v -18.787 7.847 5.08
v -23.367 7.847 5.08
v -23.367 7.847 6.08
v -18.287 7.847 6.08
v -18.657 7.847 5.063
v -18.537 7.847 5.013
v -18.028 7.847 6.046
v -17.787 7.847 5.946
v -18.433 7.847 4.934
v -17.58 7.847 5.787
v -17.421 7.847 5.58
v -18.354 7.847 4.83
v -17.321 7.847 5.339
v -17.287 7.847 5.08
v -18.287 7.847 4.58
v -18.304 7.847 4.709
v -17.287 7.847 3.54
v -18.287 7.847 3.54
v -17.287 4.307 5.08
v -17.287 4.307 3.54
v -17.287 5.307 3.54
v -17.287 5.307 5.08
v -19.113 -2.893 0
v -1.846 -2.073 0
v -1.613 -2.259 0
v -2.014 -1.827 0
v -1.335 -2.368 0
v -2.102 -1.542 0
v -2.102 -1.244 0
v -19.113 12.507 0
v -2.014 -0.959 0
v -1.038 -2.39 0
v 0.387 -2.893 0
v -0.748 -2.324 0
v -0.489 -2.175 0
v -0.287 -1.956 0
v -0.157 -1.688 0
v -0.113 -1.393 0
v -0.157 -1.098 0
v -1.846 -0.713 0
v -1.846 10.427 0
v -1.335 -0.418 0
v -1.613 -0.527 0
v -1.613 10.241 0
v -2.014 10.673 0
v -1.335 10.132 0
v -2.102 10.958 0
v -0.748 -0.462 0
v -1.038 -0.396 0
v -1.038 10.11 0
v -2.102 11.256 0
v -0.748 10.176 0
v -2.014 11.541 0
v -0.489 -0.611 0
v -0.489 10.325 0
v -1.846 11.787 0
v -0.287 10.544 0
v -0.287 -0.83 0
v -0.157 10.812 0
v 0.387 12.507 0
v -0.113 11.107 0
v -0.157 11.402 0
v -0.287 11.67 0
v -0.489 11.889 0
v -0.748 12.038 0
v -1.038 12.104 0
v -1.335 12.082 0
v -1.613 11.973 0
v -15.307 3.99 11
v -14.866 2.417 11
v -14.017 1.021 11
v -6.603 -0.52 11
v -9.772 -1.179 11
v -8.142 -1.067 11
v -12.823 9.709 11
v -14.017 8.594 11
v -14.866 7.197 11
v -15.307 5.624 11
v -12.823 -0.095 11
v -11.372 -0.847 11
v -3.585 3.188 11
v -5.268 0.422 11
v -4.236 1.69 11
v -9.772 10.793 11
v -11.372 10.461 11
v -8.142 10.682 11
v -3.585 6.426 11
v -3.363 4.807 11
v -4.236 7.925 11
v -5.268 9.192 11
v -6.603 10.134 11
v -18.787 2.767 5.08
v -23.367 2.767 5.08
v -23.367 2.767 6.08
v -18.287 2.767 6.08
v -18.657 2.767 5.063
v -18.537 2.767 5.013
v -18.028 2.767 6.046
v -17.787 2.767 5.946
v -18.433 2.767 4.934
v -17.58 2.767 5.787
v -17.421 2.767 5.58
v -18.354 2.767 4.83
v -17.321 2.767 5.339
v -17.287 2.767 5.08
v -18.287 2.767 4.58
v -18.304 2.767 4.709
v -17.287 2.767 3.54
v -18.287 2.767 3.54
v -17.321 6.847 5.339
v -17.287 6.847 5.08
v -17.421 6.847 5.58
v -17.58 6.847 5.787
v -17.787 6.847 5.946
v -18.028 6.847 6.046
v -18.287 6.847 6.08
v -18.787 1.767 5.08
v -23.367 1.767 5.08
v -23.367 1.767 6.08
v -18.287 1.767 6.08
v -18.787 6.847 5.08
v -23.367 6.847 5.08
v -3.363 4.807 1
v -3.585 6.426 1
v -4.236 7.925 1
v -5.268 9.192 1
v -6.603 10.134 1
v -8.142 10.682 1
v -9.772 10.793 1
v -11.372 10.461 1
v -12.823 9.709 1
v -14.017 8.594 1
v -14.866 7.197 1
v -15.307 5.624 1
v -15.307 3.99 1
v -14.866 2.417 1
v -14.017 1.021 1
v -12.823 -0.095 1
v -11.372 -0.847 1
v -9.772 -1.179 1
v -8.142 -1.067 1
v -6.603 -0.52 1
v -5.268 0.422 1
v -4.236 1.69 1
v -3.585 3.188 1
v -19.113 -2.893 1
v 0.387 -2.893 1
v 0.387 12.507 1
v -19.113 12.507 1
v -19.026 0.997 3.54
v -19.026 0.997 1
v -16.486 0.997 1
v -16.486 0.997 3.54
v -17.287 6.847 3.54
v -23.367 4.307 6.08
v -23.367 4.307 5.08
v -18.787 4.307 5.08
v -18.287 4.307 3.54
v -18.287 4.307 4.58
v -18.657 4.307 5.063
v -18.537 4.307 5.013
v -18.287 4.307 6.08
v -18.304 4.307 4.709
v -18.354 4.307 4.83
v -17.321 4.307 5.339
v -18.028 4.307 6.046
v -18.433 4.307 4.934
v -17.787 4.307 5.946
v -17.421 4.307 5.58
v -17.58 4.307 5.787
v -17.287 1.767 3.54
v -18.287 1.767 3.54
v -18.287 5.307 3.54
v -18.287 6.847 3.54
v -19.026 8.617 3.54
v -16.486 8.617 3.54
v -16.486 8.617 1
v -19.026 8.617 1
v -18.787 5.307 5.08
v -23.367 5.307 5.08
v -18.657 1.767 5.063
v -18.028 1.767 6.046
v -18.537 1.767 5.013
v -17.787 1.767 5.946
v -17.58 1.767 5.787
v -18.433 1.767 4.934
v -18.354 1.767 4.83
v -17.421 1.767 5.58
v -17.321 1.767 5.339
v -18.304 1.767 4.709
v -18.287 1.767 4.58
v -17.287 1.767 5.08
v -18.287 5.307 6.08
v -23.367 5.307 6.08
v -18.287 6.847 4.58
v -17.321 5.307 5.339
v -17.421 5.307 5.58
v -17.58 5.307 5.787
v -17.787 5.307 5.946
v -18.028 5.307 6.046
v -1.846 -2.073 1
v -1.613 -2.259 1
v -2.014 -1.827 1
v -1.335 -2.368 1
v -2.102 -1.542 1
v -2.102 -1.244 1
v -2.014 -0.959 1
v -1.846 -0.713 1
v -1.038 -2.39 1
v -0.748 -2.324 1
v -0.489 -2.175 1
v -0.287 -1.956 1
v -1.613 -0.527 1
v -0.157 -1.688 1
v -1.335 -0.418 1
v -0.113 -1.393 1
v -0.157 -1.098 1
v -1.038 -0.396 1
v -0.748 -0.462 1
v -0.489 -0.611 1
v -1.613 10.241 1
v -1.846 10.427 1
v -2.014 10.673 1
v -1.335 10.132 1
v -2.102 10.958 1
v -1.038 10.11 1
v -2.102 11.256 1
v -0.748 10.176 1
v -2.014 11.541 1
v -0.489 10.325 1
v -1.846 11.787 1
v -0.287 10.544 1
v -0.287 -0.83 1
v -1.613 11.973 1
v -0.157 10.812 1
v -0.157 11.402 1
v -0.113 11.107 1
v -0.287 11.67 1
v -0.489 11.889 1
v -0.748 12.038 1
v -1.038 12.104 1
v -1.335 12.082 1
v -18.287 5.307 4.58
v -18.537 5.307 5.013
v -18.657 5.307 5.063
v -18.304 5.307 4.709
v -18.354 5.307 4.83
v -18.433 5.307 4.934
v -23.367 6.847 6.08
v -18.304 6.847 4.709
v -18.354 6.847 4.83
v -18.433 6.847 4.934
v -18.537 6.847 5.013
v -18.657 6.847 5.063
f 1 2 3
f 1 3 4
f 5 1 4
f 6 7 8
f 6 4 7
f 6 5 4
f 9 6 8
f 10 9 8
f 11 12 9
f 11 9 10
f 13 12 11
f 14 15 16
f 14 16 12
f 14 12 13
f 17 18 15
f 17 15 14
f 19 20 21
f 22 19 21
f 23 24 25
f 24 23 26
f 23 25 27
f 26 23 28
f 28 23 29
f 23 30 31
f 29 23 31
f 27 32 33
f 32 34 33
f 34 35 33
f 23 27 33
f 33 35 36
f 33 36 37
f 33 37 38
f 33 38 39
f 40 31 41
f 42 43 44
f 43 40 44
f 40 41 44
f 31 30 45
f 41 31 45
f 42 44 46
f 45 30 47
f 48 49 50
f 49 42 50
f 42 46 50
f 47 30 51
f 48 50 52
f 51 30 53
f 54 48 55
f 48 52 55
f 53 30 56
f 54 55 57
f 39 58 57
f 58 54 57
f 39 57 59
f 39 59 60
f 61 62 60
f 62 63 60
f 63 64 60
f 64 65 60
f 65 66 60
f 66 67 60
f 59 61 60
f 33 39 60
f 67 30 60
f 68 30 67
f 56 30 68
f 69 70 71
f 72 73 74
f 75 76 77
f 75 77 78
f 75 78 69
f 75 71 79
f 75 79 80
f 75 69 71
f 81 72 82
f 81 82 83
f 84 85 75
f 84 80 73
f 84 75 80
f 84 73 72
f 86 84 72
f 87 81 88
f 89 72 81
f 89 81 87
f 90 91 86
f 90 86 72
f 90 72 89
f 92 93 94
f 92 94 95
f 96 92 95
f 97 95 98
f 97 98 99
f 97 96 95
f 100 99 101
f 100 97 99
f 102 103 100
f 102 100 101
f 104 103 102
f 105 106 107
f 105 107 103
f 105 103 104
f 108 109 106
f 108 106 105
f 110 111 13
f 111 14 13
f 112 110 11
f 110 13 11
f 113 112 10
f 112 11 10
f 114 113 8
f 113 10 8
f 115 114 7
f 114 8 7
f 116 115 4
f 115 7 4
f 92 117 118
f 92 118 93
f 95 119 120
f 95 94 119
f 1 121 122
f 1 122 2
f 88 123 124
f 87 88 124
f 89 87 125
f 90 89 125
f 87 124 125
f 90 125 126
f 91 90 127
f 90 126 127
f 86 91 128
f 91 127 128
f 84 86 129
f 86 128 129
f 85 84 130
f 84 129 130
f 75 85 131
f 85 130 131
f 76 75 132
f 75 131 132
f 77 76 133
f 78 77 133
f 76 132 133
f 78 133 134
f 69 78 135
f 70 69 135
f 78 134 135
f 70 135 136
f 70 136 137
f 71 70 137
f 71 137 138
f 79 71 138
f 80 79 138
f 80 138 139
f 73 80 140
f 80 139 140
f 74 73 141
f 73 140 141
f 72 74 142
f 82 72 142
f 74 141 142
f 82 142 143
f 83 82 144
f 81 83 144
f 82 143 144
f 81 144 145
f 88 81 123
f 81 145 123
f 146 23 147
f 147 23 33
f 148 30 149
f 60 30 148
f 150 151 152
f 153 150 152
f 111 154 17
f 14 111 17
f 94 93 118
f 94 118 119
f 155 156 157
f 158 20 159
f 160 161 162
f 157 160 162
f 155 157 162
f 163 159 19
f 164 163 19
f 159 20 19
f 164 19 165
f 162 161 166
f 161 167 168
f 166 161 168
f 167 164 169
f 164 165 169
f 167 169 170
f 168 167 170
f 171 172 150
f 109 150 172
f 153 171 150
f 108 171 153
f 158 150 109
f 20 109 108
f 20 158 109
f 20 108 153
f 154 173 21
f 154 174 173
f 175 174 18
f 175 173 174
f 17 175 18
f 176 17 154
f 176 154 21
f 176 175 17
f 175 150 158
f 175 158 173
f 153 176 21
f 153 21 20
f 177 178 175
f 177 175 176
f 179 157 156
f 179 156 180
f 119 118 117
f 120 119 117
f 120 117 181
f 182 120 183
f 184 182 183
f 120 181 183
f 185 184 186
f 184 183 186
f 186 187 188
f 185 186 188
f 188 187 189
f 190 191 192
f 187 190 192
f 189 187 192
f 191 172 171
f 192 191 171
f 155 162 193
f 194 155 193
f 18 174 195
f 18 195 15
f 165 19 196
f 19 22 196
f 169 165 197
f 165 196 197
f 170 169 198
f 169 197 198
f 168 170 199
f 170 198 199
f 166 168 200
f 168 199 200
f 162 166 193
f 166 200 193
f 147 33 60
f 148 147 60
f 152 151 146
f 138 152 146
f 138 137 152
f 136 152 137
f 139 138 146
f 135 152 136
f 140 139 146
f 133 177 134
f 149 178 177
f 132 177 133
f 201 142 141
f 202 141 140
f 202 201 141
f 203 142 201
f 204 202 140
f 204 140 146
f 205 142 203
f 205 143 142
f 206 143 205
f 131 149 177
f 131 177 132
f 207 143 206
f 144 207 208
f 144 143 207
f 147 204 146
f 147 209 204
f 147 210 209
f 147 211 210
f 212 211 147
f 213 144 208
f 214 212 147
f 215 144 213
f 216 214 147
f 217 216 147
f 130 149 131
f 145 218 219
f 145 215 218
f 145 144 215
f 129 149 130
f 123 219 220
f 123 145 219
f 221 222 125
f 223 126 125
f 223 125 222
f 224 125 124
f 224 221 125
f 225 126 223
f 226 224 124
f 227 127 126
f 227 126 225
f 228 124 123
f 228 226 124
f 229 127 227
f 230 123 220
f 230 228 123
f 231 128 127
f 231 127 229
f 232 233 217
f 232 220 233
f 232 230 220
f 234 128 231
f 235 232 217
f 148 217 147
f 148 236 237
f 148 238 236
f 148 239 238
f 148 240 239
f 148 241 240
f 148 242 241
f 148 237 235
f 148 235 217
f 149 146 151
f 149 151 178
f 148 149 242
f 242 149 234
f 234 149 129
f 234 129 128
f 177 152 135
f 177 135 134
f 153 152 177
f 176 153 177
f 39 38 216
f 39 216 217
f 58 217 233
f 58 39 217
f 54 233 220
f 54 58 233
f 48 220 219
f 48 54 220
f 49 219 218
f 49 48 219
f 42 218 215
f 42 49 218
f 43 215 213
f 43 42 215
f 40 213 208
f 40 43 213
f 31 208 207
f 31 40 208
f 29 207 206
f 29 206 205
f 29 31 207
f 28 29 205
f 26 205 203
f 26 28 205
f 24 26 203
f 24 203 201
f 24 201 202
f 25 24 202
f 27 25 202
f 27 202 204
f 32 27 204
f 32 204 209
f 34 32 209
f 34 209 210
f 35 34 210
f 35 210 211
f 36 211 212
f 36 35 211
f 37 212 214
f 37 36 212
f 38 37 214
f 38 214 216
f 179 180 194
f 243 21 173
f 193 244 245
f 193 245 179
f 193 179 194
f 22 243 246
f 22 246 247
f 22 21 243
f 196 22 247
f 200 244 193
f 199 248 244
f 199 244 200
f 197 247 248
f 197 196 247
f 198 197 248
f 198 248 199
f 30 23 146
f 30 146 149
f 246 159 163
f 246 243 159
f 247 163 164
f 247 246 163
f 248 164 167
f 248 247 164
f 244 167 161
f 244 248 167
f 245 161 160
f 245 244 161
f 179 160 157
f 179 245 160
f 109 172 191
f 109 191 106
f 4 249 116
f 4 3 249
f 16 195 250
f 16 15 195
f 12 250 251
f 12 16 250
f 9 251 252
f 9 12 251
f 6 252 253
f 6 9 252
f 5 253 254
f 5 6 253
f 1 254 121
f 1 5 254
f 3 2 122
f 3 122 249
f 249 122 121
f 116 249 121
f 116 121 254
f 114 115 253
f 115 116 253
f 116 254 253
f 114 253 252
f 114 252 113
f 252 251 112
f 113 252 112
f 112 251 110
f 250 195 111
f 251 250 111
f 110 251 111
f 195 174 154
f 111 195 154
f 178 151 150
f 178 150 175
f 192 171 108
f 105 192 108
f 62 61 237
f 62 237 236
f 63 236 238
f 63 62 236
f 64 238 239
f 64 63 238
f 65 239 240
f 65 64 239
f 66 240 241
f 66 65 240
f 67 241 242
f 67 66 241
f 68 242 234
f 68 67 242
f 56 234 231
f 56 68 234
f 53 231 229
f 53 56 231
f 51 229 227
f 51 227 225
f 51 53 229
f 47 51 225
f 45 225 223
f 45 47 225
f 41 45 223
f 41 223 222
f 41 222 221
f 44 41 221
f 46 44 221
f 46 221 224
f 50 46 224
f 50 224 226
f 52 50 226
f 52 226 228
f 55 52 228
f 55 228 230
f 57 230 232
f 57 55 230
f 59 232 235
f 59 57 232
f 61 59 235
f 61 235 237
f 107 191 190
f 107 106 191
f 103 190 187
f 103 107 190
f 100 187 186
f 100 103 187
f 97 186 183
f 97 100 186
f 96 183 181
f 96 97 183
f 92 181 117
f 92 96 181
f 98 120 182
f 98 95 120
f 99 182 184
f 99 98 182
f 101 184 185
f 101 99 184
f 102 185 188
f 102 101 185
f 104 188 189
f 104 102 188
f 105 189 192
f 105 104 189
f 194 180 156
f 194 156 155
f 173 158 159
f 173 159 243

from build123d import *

# Parameters (mm, degrees)
CROQUIS1_W              = 19.5
CROQUIS1_H              = 15.4
CROQUIS1_R              = 1
SALIENTE_EXTRUIR1_DEPTH = 1
CROQUIS2_R              = 6
SALIENTE_EXTRUIR2_DEPTH = 10
CROQUIS3_W              = 2.54
CROQUIS3_H              = 7.62
SALIENTE_EXTRUIR3_DEPTH = 2.54
CROQUIS4_W              = 1
CROQUIS4_H              = 1
SALIENTE_EXTRUIR4_DEPTH = 2.54
CROQUIS6_W              = 1
CROQUIS6_H              = 1
SALIENTE_EXTRUIR5_DEPTH = 5.08
REDONDEO2_R             = 1
REDONDEO3_R             = 1
REDONDEO4_R             = 1
REDONDEO5_R             = 0.5
REDONDEO6_R             = 0.5
REDONDEO7_R             = 0.5


with BuildPart() as part:
    # Croquis1 → Saliente-Extruir1 (new body)
    with BuildSketch(Plane.XY):
        with Locations((-9.362960818, 4.807039504)):
            Rectangle(CROQUIS1_W, CROQUIS1_H)
        with Locations((-1.112960818, -1.392960496)):
            Circle(CROQUIS1_R, mode=Mode.SUBTRACT)
        with Locations((-1.112960818, 11.107039504)):
            Circle(CROQUIS1_R, mode=Mode.SUBTRACT)
    extrude(amount=SALIENTE_EXTRUIR1_DEPTH)

    # Croquis2 → Saliente-Extruir2 (add)
    with BuildSketch(Plane.XY.offset(1)):
        with Locations((-9.362960818, 4.807039504)):
            Circle(CROQUIS2_R)
    extrude(amount=SALIENTE_EXTRUIR2_DEPTH)

    # Croquis3 → Saliente-Extruir3 (add)
    with BuildSketch(Plane.XY.offset(1)):
        with Locations((-17.75568674, 4.807039504)):
            Rectangle(CROQUIS3_W, CROQUIS3_H)
    extrude(amount=SALIENTE_EXTRUIR3_DEPTH)

    # Croquis4 → Saliente-Extruir4 (add)
    with BuildSketch(Plane.XY.offset(3.54)):
        with Locations((-17.786846734, 7.347039504)):
            Rectangle(CROQUIS4_W, CROQUIS4_H)
        with Locations((-17.786846734, 4.807039504)):
            Rectangle(CROQUIS4_W, CROQUIS4_H)
        with Locations((-17.786846734, 2.267039504)):
            Rectangle(CROQUIS4_W, CROQUIS4_H)
    extrude(amount=SALIENTE_EXTRUIR4_DEPTH)

    # Croquis6 → Saliente-Extruir5 (add)
    with BuildSketch(Plane.ZY.offset(18.286846734)):
        with Locations((5.58, 4.807039504)):
            Rectangle(CROQUIS6_W, CROQUIS6_H)
        with Locations((5.58, 2.267039504)):
            Rectangle(CROQUIS6_W, CROQUIS6_H)
        with Locations((5.58, 7.347039504)):
            Rectangle(CROQUIS6_W, CROQUIS6_H)
    extrude(amount=SALIENTE_EXTRUIR5_DEPTH)

    # Redondeo2
    redondeo2_edges = [part.edges().sort_by_distance(p)[0] for p in [
        (-17.286846734, 2.267039504, 6.08),
    ]]
    fillet(redondeo2_edges, radius=REDONDEO2_R)

    # Redondeo3
    redondeo3_edges = [part.edges().sort_by_distance(p)[0] for p in [
        (-17.286846734, 4.807039504, 6.08),
    ]]
    fillet(redondeo3_edges, radius=REDONDEO3_R)

    # Redondeo4
    redondeo4_edges = [part.edges().sort_by_distance(p)[0] for p in [
        (-17.286846734, 7.347039504, 6.08),
    ]]
    fillet(redondeo4_edges, radius=REDONDEO4_R)

    # Redondeo5
    redondeo5_edges = [part.edges().sort_by_distance(p)[0] for p in [
        (-18.286846734, 2.267039504, 5.08),
    ]]
    fillet(redondeo5_edges, radius=REDONDEO5_R)

    # Redondeo6
    redondeo6_edges = [part.edges().sort_by_distance(p)[0] for p in [
        (-18.286846734, 4.807039504, 5.08),
    ]]
    fillet(redondeo6_edges, radius=REDONDEO6_R)

    # Redondeo7
    redondeo7_edges = [part.edges().sort_by_distance(p)[0] for p in [
        (-18.286846734, 7.347039504, 5.08),
    ]]
    fillet(redondeo7_edges, radius=REDONDEO7_R)


solid = part.part
